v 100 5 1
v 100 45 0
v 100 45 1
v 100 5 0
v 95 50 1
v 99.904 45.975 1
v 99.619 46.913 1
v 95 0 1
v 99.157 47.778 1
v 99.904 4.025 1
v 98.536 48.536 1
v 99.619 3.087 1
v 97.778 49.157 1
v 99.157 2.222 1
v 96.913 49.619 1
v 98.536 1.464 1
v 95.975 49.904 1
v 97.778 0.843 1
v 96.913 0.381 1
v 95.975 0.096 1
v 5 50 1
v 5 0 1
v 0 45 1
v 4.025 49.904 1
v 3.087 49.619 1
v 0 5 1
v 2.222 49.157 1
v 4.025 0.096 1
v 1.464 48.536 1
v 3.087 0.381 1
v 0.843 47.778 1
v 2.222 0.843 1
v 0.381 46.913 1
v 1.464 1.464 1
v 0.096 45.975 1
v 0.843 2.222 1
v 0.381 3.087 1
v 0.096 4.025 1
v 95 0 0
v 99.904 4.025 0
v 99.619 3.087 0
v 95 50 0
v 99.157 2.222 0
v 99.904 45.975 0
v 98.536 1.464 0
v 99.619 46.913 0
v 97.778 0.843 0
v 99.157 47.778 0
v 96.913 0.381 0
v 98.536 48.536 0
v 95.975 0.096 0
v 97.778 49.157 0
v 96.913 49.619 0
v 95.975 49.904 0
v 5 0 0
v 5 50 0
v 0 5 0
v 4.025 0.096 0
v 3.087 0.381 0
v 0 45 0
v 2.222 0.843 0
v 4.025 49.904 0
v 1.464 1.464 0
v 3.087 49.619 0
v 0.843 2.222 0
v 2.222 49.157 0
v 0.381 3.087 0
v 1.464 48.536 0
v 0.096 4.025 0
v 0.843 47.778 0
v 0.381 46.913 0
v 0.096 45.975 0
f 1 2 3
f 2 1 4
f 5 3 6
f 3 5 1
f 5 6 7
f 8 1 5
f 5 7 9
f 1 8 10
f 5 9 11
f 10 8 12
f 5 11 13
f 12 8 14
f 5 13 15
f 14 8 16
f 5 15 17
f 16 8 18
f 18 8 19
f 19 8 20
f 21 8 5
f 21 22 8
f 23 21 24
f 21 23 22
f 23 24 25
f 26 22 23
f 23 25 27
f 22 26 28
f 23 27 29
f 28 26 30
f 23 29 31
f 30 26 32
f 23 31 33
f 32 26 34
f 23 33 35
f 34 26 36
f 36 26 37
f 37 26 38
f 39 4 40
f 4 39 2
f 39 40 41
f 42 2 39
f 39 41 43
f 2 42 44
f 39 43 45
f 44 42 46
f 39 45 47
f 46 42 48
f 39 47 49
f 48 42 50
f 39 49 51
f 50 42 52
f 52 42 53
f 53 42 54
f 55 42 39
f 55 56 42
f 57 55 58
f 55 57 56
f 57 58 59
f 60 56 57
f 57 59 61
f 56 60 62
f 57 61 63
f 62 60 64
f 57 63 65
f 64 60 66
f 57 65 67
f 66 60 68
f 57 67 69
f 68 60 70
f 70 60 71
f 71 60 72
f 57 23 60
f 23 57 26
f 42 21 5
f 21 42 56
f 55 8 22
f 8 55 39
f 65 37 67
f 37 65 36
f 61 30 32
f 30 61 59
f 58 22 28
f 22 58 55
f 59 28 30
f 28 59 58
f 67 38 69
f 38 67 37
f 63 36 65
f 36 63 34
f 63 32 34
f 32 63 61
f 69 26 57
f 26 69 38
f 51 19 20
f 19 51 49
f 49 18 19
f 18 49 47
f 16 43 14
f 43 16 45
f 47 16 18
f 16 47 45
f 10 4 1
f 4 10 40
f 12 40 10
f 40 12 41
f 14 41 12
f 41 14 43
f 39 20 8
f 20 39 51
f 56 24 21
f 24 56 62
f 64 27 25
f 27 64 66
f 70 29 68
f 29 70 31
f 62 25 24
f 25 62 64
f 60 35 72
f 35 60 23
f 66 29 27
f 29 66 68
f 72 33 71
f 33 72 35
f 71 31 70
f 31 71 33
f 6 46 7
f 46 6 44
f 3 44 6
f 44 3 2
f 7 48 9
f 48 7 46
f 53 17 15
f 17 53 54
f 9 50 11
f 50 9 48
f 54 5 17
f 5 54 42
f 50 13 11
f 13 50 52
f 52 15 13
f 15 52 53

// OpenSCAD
size_x=100;
size_y=50;
size_z=1;
corner_radius=5;
corner_faces=32;



module plate (sizeX, sizeY, sizeZ, cornerRadius, cornerFaces)
{
	union()
	{
		difference()
		{
			cube([sizeX,sizeY,sizeZ]);		
			cube([cornerRadius,cornerRadius,	sizeZ+1]);
			translate([sizeX-cornerRadius,0,0]) cube([cornerRadius,cornerRadius,sizeZ+1]);
			translate([0,sizeY-cornerRadius,0]) cube([cornerRadius,cornerRadius,sizeZ+1]);
			translate([sizeX-cornerRadius,sizeY-cornerRadius,0]) cube([cornerRadius,cornerRadius,sizeZ+1]);
		}
		translate([cornerRadius,cornerRadius,0]) cylinder(r=cornerRadius,h=sizeZ, $fn=cornerFaces);
		translate([sizeX-cornerRadius,cornerRadius,0]) cylinder(r=cornerRadius,h=sizeZ, $fn=cornerFaces);
		translate([cornerRadius,sizeY-cornerRadius,0]) cylinder(r=cornerRadius,h=sizeZ, $fn=cornerFaces);
		translate([sizeX-cornerRadius,sizeY-cornerRadius,0]) cylinder(r=cornerRadius,h=sizeZ, $fn=cornerFaces);
	}
}

plate (size_x, size_y, size_z, corner_radius, corner_faces);
